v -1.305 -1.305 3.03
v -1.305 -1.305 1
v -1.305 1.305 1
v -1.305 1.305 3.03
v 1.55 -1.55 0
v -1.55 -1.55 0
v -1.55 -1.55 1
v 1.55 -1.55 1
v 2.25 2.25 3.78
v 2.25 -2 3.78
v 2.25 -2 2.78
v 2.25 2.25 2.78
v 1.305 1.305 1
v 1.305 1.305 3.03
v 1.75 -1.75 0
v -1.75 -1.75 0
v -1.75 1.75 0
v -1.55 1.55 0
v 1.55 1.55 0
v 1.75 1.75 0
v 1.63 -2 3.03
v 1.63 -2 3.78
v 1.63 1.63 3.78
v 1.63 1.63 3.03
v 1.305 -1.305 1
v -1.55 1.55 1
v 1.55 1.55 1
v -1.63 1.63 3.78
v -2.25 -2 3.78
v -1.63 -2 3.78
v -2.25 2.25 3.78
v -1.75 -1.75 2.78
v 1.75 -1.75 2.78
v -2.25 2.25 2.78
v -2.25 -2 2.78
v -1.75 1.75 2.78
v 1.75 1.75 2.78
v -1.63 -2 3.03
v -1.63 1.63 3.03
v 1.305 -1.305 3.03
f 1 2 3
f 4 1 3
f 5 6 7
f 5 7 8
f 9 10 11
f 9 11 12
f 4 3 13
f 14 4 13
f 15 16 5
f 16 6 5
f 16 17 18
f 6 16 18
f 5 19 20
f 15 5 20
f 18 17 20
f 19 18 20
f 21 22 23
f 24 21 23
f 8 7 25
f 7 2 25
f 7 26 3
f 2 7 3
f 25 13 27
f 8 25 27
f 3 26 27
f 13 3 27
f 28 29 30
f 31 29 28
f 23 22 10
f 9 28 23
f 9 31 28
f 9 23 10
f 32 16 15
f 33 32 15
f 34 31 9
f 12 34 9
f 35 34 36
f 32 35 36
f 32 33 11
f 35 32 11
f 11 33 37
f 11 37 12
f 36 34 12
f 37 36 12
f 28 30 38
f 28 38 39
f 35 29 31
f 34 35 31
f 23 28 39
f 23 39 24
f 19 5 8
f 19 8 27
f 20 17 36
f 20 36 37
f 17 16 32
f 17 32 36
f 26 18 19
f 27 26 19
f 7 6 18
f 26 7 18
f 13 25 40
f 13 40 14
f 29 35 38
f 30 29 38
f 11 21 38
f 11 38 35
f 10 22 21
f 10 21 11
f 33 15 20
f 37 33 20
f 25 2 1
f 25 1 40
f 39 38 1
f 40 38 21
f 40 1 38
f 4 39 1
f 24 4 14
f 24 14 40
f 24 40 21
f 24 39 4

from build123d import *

# Parameters (mm, degrees)
SKETCH2_W           = 3.5
SKETCH2_H           = 3.5
SKETCH2_W_2         = 2.61
SKETCH2_H_2         = 2.61
BOSS_EXTRUDE1_DEPTH = 3.78
SKETCH3_W           = 3.1
SKETCH3_H           = 3.1
SKETCH3_W_2         = 2.61
SKETCH3_H_2         = 2.61
CUT_EXTRUDE1_DEPTH  = 1
SKETCH4_W           = 4.5
SKETCH4_H           = 4.25
SKETCH4_W_2         = 3.5
SKETCH4_H_2         = 3.5
BOSS_EXTRUDE2_DEPTH = 1
SKETCH5_W           = 3.26
SKETCH5_H           = 6.003564401
CUT_EXTRUDE2_DEPTH  = 0.75


with BuildPart() as part:
    # Sketch2 → Boss-Extrude1 (new body)
    with BuildSketch(Plane.XY):
        Rectangle(SKETCH2_W, SKETCH2_H)
        Rectangle(SKETCH2_W_2, SKETCH2_H_2, mode=Mode.SUBTRACT)
    extrude(amount=BOSS_EXTRUDE1_DEPTH)

    # Sketch3 → Cut-Extrude1 (cut)
    with BuildSketch(Plane.XY):
        Rectangle(SKETCH3_W, SKETCH3_H)
        Rectangle(SKETCH3_W_2, SKETCH3_H_2, mode=Mode.SUBTRACT)
    extrude(amount=CUT_EXTRUDE1_DEPTH, mode=Mode.SUBTRACT)

    # Sketch4 → Boss-Extrude2 (add)
    with BuildSketch(Plane.XY.offset(3.78)):
        with Locations((0, 0.125)):
            Rectangle(SKETCH4_W, SKETCH4_H)
        Rectangle(SKETCH4_W_2, SKETCH4_H_2, mode=Mode.SUBTRACT)
    extrude(amount=-BOSS_EXTRUDE2_DEPTH)

    # Sketch5 → Cut-Extrude2 (cut)
    with BuildSketch(Plane.XY.offset(3.78)):
        with Locations((0, -1.371782201)):
            Rectangle(SKETCH5_W, SKETCH5_H)
    extrude(amount=-CUT_EXTRUDE2_DEPTH, mode=Mode.SUBTRACT)


solid = part.part
